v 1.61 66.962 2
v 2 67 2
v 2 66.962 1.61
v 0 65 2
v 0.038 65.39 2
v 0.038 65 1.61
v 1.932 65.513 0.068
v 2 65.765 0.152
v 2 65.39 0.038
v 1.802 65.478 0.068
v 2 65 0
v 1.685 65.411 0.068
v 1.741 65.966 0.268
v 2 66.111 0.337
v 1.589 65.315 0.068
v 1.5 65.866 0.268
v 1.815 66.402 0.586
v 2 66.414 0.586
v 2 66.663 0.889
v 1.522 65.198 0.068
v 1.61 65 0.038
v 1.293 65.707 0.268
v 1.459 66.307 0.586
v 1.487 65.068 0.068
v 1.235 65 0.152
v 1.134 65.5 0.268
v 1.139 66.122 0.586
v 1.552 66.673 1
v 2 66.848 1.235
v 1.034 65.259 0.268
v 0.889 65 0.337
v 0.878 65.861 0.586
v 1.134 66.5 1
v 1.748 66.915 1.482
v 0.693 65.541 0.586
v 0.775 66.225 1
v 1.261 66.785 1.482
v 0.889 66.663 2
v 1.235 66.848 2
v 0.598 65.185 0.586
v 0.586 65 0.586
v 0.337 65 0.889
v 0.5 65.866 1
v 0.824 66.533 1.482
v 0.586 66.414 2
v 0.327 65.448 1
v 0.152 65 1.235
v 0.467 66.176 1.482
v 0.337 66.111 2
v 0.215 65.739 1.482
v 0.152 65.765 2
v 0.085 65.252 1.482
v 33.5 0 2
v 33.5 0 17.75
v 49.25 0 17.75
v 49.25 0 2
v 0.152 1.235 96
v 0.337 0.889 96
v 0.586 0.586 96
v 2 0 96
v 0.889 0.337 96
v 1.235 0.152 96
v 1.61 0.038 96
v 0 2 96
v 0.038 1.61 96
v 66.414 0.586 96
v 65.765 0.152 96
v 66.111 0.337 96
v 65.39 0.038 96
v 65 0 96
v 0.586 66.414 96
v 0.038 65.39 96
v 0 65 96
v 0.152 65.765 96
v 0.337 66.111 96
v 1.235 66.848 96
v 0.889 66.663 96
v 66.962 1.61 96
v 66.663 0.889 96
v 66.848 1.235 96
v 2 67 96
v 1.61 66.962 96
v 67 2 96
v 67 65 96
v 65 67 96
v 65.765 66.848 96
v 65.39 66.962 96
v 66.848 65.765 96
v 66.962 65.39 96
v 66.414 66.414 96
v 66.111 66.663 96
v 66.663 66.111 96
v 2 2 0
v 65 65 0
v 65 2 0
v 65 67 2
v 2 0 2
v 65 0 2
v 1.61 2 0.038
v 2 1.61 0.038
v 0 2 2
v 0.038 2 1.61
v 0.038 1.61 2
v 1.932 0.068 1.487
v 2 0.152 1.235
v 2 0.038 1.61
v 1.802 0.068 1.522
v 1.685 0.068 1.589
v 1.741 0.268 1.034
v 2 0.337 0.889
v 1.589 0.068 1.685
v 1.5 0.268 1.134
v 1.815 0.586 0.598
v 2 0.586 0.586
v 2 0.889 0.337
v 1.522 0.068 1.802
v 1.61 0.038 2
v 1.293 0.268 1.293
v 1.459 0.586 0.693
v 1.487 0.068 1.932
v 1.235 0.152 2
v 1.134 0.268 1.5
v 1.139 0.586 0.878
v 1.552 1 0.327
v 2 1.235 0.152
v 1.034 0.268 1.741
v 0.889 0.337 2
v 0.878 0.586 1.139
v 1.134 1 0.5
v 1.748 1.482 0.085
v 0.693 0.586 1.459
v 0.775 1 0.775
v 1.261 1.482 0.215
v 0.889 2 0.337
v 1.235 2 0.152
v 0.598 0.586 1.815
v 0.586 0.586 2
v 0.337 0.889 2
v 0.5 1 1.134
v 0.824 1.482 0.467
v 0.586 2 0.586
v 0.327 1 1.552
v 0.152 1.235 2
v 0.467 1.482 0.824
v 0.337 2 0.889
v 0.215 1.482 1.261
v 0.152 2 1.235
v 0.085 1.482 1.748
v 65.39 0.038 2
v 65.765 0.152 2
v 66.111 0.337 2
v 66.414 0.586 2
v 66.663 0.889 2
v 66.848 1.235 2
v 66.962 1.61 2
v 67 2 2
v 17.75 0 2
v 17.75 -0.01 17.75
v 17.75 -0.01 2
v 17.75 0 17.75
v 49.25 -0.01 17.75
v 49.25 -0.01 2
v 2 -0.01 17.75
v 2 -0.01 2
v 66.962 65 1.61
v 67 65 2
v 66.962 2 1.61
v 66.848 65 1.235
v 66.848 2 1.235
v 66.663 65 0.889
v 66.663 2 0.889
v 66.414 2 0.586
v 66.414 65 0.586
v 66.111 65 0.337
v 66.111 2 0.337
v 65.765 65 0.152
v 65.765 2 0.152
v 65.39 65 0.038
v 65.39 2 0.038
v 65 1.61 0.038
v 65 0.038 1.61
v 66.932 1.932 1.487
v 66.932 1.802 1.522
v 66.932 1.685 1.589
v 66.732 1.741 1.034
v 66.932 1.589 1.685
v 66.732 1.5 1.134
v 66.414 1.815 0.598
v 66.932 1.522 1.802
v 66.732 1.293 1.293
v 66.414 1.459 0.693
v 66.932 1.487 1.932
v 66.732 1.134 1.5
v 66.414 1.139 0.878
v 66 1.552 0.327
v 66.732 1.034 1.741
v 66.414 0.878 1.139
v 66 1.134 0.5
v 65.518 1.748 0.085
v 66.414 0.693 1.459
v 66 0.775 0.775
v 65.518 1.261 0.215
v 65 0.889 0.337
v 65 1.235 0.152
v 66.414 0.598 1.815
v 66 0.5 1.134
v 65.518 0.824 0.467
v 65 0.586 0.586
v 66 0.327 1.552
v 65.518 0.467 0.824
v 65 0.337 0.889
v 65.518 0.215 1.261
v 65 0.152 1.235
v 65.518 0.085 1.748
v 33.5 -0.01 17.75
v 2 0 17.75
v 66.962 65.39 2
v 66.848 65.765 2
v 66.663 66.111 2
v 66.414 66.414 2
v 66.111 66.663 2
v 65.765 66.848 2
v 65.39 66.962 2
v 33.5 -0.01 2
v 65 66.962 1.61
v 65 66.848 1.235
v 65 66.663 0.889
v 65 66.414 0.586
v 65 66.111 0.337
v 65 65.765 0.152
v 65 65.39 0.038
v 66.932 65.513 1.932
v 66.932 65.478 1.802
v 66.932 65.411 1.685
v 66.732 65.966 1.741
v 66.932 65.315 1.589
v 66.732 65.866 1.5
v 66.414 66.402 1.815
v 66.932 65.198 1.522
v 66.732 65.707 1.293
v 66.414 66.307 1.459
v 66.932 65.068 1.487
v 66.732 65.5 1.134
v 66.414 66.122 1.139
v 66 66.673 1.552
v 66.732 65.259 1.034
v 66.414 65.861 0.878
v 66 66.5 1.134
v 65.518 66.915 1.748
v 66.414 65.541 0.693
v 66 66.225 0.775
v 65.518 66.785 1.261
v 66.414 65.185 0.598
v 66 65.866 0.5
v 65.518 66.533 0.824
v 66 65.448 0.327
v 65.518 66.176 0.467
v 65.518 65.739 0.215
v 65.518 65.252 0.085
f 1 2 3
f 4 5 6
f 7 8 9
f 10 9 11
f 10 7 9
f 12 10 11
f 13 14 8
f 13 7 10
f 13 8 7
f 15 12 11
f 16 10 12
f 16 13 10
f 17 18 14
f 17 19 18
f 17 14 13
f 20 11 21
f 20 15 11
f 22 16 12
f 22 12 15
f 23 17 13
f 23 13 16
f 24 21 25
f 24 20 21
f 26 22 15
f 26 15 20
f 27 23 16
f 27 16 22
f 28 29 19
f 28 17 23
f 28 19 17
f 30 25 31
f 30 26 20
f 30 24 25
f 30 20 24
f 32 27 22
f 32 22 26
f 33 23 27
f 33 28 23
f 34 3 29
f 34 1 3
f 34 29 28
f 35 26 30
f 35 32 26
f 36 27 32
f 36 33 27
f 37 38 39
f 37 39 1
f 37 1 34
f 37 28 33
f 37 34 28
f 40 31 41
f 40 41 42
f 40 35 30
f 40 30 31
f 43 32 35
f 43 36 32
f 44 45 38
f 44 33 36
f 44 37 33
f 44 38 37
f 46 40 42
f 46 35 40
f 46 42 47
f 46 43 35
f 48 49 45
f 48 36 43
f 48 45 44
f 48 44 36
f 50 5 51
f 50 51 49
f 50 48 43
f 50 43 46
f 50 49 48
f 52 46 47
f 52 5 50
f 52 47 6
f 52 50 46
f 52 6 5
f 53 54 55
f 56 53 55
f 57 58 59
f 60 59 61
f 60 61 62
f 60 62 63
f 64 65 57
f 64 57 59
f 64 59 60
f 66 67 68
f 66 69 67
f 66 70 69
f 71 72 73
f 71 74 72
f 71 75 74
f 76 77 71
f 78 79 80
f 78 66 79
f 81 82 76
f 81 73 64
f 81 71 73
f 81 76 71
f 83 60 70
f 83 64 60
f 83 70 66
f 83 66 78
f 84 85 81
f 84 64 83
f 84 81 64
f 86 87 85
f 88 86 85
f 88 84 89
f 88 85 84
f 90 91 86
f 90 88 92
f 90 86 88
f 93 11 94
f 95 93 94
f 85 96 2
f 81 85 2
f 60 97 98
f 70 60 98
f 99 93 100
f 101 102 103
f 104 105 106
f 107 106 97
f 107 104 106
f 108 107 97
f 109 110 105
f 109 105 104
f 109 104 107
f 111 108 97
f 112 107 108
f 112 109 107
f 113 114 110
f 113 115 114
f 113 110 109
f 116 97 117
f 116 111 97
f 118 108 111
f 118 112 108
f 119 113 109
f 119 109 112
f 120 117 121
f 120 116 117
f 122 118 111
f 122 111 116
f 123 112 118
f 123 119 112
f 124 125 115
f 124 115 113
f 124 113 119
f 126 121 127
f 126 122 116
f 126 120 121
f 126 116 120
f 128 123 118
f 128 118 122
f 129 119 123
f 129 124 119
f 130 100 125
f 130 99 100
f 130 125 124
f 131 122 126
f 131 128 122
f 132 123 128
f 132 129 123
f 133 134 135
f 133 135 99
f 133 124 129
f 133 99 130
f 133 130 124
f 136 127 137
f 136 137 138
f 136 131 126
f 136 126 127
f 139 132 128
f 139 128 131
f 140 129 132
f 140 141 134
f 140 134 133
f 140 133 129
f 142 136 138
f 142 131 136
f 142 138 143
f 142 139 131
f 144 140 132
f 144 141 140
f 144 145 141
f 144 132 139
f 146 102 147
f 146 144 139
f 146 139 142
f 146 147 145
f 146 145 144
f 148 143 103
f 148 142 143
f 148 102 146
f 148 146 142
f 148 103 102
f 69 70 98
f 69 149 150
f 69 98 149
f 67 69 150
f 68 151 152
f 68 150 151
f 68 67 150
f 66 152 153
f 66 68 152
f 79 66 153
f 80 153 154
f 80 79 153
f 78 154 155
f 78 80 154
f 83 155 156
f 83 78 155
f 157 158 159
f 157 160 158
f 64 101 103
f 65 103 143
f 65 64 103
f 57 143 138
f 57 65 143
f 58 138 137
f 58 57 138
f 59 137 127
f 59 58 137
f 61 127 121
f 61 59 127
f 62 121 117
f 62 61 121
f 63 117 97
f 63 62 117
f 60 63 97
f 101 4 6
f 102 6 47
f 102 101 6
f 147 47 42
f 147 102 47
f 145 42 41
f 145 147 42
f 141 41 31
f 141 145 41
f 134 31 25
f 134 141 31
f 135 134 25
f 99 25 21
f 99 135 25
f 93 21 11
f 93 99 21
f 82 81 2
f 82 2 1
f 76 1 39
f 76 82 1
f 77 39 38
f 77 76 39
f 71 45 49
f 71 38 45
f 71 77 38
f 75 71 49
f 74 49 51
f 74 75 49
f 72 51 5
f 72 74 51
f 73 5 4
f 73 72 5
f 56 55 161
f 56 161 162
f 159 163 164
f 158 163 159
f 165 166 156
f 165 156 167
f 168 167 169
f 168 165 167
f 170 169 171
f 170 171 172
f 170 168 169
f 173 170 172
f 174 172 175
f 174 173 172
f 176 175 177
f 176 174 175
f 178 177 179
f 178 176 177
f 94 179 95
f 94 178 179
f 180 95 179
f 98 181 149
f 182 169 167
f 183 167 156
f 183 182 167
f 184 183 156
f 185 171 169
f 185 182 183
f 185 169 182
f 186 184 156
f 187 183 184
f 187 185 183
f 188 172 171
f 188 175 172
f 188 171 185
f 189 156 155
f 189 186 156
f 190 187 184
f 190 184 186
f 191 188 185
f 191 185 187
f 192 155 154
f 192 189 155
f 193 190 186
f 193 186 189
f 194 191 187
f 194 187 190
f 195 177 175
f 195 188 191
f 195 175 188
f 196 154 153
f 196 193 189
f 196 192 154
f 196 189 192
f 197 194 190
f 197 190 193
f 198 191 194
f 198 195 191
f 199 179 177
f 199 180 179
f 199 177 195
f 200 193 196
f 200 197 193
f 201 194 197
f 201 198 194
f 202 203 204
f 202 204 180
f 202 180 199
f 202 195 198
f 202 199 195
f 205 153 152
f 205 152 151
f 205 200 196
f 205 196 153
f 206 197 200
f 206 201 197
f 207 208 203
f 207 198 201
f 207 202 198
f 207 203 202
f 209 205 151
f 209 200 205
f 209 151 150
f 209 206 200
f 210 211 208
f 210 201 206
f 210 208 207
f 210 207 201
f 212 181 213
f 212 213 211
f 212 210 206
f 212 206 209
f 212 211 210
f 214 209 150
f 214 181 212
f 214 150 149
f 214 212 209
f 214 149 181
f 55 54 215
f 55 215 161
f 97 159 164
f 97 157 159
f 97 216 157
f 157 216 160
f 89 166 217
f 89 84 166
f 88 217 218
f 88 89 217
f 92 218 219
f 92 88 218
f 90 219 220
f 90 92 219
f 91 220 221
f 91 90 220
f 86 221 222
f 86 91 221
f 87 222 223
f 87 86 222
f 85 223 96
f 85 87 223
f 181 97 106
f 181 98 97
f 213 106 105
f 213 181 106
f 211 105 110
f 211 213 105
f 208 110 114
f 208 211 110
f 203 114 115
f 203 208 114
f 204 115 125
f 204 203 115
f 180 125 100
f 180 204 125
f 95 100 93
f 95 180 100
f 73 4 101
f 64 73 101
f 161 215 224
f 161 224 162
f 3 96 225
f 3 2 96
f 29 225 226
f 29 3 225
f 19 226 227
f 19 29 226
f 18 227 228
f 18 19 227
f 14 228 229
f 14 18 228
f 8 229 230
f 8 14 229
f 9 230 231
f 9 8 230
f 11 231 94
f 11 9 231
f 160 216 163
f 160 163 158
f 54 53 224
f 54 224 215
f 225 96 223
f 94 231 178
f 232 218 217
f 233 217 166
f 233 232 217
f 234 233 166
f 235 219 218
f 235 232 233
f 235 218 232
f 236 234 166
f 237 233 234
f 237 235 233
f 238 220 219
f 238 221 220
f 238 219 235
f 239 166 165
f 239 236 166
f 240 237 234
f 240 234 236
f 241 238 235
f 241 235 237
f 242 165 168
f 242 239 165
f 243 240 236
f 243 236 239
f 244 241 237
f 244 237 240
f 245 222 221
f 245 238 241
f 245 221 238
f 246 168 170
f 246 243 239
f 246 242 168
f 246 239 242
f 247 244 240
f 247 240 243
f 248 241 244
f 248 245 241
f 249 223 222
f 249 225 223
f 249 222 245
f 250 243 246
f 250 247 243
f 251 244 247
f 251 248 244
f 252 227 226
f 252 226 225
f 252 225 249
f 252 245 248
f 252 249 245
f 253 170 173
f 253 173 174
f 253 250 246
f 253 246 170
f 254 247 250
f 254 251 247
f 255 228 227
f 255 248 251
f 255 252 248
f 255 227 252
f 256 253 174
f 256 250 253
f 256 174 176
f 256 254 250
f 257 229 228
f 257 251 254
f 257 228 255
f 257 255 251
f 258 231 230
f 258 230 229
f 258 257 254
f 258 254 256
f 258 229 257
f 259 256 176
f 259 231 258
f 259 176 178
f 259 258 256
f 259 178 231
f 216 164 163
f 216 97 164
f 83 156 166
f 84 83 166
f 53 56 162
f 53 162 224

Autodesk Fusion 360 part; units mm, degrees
sketch "Leg" plane through (0, 0, 0) normal (0, 0, 1) x (1, 0, 0)
  line L0 (0, 0) -> (67, 0)
  line L1 (67, 0) -> (67, 67)
  line L2 (67, 67) -> (0, 67)
  line L3 (0, 67) -> (0, 0)
  dimension "d2" = 67
  dimension "d3" = 67
extrude "Extrude1" add sketch "Leg" along normal blind 96 makes body 1
sketch "Toes" plane through (0, 0, 0) normal (0, -1, 0) x (1, 0, 0)
  line L0 (0, 0) -> (67, 0)
  line L1 (67, 0) -> (67, 96)
  line L2 (67, 96) -> (0, 96)
  line L3 (0, 96) -> (0, 0)
  line L4 (2, 17.75) -> (17.75, 17.75)
  line L5 (17.75, 17.75) -> (17.75, 2)
  line L6 (17.75, 2) -> (2, 2)
  line L7 (2, 2) -> (2, 17.75)
  line L8 (33.5, 17.75) -> (49.25, 17.75)
  line L9 (49.25, 17.75) -> (49.25, 2)
  line L10 (49.25, 2) -> (33.5, 2)
  line L11 (33.5, 2) -> (33.5, 17.75)
  dimension "d16" = 15.75
  dimension "d17" = 15.75
  dimension "d18" = 15.75
  dimension "d19" = 2
  dimension "d20" = 2
  dimension "d21" = 15.75
  dimension "d22" = 17.75
extrude "Extrude3" add sketch "Toes" along normal blind 0.01 separate body contours L4 L5 L6 L7 | L8 L9 L10 L11 makes body 2 at (7.25, 0, 7.25) makes body 3 at (38.75, 0, 7.25)
fillet "Fillet1" radius 2 8 edges at (0, 67, 48) (0, 33.5, 0) (0, 0, 48) (33.5, 0, 0) (67, 0, 48) (33.5, 67, 0) (67, 33.5, 0) (67, 67, 48) on bodies 1
equation "leg_width = 67 mm" comment "The dimensions of the 67 mm x 67 mm pine post used for the Legs."
equation "d2 = leg_width"
equation "d3 = leg_width"
equation "block_size = 16 mm" comment "The size of the blocks used for the dimensions of the Minecraft Pig."
equation "d5 = leg_height"
equation "fillet_radius = 2 mm" comment "The radius of the fillets applied to the Legs."
equation "d16 = toe_width"
equation "d17 = toe_width"
equation "d18 = toe_width"
equation "d19 = fillet_radius"
equation "d20 = fillet_radius"
equation "d21 = toe_width"
equation "d26 = fillet_radius"
equation "toe_width = ( leg_width - 2 * fillet_radius ) / 4" comment "The width and height of the two toes."
equation "leg_height = 6 * block_size" comment "The height of the Minecraft Pig's Legs."
